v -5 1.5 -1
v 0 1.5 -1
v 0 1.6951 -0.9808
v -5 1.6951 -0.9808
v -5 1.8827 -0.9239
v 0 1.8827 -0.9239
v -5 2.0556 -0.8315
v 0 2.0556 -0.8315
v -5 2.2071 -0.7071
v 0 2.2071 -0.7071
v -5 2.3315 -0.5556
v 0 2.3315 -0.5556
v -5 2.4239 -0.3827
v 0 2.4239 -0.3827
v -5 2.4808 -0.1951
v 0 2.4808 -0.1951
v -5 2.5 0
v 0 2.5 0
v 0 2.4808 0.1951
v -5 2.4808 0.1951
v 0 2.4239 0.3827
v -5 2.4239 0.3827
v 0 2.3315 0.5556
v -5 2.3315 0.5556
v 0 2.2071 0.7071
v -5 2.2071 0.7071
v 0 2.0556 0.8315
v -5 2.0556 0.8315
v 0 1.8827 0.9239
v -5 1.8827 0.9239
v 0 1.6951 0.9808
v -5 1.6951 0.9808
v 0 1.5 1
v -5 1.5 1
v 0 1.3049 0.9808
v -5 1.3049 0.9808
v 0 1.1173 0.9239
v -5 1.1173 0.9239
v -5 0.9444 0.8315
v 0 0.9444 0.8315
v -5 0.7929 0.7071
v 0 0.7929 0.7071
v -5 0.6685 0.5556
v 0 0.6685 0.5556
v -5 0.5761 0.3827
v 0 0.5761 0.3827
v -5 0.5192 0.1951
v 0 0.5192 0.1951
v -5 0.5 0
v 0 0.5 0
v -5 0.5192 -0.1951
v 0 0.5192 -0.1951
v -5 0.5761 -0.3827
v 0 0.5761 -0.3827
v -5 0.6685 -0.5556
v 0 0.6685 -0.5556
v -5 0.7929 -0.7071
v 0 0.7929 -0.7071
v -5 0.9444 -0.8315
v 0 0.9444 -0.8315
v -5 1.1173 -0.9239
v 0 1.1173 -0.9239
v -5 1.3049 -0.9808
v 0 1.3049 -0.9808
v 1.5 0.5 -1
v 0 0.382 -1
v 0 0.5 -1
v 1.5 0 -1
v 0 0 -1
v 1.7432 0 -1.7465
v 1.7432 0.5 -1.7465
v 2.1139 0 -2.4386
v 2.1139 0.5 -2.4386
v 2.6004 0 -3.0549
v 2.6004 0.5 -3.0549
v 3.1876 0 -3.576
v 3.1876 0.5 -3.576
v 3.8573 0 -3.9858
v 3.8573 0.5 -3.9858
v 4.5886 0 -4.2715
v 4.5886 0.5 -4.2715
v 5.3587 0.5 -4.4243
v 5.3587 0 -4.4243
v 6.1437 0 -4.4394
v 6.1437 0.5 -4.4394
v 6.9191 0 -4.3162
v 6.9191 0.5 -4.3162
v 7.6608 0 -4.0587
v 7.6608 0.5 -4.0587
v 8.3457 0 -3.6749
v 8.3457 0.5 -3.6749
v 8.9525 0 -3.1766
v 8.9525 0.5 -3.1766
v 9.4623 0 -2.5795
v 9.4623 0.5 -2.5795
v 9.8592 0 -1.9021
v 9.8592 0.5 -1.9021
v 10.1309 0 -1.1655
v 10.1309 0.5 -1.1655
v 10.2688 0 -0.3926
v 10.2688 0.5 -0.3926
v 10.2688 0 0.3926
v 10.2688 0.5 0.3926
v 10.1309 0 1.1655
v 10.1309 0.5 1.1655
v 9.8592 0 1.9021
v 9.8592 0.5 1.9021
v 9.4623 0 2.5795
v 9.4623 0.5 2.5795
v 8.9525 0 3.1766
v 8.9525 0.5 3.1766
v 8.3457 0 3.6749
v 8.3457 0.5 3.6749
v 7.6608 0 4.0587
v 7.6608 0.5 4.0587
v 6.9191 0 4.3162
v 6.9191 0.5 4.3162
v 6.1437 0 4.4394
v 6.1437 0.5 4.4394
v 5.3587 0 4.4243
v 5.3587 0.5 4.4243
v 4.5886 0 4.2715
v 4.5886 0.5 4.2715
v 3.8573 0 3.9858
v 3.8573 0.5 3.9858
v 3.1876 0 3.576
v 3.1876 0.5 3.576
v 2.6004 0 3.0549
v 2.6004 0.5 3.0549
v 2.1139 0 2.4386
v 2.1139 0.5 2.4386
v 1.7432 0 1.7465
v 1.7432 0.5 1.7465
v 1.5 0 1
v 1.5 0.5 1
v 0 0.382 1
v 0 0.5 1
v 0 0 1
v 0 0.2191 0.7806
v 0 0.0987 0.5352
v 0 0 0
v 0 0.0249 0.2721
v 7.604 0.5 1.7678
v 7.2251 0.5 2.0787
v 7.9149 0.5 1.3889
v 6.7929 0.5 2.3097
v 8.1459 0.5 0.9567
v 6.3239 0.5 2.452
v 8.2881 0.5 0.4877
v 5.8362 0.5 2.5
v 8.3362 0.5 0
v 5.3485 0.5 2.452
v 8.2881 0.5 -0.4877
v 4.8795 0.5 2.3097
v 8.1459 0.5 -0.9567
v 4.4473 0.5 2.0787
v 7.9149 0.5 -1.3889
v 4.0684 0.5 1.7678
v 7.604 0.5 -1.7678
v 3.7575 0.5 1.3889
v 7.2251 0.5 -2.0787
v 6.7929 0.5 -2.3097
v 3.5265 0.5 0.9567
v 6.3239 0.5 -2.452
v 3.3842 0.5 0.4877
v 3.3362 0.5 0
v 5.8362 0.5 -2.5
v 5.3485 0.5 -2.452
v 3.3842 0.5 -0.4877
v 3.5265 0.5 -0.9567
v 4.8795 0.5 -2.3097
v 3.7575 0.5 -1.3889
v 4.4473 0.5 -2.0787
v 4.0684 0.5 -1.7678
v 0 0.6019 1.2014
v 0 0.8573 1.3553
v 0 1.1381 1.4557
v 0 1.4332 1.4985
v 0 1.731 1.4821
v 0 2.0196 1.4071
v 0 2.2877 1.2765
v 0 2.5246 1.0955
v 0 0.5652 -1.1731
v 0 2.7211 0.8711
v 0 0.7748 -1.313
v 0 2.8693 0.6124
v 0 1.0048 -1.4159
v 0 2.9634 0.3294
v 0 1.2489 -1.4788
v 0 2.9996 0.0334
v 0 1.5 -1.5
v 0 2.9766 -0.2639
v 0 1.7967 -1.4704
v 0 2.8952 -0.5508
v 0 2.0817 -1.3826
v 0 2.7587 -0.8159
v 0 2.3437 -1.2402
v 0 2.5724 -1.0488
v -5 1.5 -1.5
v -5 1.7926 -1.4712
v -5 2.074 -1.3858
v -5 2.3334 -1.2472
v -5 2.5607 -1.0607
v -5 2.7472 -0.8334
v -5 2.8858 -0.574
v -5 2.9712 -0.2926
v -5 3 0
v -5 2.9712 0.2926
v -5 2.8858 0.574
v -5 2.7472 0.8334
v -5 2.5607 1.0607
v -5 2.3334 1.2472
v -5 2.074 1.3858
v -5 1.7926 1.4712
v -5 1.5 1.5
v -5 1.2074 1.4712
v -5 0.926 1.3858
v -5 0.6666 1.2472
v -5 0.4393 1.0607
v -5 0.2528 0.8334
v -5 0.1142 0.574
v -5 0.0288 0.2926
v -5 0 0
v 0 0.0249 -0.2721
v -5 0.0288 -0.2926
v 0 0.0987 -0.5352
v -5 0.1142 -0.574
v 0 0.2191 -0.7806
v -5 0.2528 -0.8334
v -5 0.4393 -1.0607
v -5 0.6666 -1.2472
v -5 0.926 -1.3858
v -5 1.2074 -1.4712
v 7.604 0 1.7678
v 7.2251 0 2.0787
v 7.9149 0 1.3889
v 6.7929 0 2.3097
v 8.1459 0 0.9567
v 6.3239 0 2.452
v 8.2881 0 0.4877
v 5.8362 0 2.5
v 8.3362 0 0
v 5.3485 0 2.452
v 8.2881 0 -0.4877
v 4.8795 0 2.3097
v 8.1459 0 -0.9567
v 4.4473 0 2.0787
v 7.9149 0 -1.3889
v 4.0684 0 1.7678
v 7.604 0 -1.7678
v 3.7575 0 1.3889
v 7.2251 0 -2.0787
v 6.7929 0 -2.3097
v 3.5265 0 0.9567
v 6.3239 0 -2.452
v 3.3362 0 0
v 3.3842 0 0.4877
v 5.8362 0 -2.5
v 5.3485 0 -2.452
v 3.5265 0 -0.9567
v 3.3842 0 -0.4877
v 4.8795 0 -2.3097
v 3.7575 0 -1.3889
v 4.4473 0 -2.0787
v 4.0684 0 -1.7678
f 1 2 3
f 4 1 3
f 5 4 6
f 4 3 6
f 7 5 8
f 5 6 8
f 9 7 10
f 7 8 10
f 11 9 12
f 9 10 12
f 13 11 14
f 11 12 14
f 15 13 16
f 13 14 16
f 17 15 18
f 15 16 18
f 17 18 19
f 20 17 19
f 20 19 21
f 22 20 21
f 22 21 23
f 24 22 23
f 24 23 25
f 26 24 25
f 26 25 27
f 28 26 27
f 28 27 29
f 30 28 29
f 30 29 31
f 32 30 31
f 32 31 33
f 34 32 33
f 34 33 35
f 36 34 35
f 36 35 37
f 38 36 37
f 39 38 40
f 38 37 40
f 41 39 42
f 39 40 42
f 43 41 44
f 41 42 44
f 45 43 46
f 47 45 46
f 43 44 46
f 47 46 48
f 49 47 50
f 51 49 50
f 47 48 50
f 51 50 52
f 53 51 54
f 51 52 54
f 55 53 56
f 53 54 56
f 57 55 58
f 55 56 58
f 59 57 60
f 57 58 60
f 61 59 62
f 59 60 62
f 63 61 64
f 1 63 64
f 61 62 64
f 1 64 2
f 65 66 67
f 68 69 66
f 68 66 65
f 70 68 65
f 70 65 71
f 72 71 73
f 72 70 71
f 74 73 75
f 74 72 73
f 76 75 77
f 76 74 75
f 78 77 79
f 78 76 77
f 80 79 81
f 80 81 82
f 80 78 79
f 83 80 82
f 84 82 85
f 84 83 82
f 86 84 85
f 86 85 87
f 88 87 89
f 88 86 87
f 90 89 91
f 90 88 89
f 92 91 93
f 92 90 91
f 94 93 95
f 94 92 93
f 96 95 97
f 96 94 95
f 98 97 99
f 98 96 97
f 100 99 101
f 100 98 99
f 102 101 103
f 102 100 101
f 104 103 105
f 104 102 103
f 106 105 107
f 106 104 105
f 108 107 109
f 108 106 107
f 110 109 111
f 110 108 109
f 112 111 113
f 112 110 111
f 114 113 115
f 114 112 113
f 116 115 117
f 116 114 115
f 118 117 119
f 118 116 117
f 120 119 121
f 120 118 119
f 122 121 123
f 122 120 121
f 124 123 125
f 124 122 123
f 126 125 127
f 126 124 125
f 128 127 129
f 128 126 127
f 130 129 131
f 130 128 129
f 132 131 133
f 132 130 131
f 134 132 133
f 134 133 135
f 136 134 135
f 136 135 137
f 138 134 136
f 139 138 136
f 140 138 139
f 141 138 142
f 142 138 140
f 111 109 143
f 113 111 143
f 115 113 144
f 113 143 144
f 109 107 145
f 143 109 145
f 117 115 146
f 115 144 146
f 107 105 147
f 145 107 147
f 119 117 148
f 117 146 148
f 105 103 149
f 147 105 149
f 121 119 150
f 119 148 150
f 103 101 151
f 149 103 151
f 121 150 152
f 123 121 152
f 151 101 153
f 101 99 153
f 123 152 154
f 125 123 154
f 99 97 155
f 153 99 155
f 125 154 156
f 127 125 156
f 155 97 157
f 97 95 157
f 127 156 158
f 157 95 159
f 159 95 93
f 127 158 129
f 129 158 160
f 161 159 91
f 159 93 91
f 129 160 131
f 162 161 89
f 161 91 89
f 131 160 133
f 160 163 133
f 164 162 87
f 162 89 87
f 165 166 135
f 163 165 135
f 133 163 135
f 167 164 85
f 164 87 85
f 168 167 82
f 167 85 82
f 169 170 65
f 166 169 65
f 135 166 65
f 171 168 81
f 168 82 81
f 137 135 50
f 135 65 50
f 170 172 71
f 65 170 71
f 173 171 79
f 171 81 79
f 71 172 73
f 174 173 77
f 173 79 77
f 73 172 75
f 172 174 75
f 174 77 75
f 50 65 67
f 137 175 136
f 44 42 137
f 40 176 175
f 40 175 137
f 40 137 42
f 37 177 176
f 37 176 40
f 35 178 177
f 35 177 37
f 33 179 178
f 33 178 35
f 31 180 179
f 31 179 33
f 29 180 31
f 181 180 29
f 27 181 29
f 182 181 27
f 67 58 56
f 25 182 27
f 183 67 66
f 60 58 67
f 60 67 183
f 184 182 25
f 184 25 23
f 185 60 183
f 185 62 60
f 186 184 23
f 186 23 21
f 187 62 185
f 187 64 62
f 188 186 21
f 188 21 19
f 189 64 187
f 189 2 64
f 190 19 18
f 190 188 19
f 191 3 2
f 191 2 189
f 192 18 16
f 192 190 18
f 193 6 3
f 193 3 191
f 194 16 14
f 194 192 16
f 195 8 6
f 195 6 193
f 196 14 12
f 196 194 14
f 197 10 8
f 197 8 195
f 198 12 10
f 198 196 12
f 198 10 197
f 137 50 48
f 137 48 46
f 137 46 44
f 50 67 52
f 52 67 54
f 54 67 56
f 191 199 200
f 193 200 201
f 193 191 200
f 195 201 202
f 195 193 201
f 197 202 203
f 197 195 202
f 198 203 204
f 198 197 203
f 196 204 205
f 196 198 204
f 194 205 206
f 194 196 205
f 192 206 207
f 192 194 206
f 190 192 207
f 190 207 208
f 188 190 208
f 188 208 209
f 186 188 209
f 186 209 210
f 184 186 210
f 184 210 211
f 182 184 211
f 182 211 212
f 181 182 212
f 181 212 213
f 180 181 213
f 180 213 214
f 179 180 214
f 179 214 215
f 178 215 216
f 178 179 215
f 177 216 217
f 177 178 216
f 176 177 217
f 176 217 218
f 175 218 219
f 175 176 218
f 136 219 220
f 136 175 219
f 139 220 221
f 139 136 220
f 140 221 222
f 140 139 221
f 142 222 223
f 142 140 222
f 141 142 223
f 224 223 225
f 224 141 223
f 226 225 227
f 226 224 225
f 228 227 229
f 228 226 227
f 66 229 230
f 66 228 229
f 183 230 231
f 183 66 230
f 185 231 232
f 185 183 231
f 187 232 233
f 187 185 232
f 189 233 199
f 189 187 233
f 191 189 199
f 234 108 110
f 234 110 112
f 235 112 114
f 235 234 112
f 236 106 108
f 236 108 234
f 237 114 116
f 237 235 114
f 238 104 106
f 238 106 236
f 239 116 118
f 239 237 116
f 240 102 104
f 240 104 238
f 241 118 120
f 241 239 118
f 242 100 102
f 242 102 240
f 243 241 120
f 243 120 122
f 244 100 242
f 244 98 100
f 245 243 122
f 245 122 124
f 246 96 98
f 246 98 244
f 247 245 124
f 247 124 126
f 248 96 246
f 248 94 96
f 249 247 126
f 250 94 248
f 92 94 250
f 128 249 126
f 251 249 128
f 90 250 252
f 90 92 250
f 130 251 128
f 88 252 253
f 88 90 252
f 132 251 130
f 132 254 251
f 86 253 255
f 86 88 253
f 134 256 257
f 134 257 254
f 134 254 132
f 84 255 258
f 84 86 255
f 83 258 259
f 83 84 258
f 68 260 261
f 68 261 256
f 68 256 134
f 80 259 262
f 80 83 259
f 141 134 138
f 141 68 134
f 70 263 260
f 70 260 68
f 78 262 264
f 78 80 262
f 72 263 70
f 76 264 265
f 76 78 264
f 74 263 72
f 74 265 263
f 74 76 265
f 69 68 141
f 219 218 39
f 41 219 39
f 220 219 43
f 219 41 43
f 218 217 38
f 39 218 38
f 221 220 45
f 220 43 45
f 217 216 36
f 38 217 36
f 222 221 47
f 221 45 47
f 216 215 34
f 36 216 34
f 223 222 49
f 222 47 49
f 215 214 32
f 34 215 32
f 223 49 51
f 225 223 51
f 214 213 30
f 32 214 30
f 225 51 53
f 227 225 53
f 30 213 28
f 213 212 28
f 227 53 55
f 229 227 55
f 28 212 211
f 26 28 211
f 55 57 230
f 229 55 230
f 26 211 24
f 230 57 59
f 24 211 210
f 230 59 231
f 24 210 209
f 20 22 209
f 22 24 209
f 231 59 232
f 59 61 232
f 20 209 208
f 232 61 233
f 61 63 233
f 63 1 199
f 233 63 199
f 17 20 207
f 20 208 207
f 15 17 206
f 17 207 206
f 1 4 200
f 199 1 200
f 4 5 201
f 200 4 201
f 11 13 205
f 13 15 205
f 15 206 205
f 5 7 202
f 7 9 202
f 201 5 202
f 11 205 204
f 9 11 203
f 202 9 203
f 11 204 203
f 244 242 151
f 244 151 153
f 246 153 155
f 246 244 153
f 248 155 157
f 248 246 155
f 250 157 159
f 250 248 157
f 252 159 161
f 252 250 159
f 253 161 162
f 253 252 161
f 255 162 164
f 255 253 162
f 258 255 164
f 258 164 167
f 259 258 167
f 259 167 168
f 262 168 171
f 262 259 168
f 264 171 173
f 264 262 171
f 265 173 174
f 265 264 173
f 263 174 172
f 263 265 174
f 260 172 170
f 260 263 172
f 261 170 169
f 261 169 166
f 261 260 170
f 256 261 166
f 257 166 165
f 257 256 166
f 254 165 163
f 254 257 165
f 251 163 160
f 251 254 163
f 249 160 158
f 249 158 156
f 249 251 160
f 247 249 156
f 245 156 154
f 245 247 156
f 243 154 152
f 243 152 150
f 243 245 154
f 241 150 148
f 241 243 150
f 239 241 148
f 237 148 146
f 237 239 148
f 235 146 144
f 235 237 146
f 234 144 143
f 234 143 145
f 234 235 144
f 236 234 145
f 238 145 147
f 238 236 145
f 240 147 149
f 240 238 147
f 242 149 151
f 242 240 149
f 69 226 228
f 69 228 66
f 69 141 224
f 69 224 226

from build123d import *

# Parameters (mm, degrees)
SKETCH1_R           = 2.5
BOSS_EXTRUDE1_DEPTH = 0.5
SKETCH2_R           = 1.5
SKETCH2_R_2         = 1
BOSS_EXTRUDE2_DEPTH = 5


with BuildPart() as part:
    # Sketch1 → Boss-Extrude1 (new body)
    with BuildSketch(Plane(origin=(0, 0, 0), x_dir=(1, 0, 0), z_dir=(0, 1, 0))):
        with BuildLine():
            Line((0, -1), (0, 1))
            Line((0, 1), (1.5, 1))
            ThreePointArc((1.5, 1), (10.286184959, 0), (1.5, -1))
            Line((1.5, -1), (0, -1))
        make_face()
        with Locations((5.836184959, 0)):
            Circle(SKETCH1_R, mode=Mode.SUBTRACT)
    extrude(amount=BOSS_EXTRUDE1_DEPTH)

    # Sketch2 → Boss-Extrude2 (add)
    with BuildSketch(Plane(origin=(0, 0, 0), x_dir=(0, 0, -1), z_dir=(1, 0, 0))):
        with Locations((0, 1.5)):
            Circle(SKETCH2_R)
        with Locations((0, 1.5)):
            Circle(SKETCH2_R_2, mode=Mode.SUBTRACT)
    extrude(amount=-BOSS_EXTRUDE2_DEPTH)


solid = part.part
